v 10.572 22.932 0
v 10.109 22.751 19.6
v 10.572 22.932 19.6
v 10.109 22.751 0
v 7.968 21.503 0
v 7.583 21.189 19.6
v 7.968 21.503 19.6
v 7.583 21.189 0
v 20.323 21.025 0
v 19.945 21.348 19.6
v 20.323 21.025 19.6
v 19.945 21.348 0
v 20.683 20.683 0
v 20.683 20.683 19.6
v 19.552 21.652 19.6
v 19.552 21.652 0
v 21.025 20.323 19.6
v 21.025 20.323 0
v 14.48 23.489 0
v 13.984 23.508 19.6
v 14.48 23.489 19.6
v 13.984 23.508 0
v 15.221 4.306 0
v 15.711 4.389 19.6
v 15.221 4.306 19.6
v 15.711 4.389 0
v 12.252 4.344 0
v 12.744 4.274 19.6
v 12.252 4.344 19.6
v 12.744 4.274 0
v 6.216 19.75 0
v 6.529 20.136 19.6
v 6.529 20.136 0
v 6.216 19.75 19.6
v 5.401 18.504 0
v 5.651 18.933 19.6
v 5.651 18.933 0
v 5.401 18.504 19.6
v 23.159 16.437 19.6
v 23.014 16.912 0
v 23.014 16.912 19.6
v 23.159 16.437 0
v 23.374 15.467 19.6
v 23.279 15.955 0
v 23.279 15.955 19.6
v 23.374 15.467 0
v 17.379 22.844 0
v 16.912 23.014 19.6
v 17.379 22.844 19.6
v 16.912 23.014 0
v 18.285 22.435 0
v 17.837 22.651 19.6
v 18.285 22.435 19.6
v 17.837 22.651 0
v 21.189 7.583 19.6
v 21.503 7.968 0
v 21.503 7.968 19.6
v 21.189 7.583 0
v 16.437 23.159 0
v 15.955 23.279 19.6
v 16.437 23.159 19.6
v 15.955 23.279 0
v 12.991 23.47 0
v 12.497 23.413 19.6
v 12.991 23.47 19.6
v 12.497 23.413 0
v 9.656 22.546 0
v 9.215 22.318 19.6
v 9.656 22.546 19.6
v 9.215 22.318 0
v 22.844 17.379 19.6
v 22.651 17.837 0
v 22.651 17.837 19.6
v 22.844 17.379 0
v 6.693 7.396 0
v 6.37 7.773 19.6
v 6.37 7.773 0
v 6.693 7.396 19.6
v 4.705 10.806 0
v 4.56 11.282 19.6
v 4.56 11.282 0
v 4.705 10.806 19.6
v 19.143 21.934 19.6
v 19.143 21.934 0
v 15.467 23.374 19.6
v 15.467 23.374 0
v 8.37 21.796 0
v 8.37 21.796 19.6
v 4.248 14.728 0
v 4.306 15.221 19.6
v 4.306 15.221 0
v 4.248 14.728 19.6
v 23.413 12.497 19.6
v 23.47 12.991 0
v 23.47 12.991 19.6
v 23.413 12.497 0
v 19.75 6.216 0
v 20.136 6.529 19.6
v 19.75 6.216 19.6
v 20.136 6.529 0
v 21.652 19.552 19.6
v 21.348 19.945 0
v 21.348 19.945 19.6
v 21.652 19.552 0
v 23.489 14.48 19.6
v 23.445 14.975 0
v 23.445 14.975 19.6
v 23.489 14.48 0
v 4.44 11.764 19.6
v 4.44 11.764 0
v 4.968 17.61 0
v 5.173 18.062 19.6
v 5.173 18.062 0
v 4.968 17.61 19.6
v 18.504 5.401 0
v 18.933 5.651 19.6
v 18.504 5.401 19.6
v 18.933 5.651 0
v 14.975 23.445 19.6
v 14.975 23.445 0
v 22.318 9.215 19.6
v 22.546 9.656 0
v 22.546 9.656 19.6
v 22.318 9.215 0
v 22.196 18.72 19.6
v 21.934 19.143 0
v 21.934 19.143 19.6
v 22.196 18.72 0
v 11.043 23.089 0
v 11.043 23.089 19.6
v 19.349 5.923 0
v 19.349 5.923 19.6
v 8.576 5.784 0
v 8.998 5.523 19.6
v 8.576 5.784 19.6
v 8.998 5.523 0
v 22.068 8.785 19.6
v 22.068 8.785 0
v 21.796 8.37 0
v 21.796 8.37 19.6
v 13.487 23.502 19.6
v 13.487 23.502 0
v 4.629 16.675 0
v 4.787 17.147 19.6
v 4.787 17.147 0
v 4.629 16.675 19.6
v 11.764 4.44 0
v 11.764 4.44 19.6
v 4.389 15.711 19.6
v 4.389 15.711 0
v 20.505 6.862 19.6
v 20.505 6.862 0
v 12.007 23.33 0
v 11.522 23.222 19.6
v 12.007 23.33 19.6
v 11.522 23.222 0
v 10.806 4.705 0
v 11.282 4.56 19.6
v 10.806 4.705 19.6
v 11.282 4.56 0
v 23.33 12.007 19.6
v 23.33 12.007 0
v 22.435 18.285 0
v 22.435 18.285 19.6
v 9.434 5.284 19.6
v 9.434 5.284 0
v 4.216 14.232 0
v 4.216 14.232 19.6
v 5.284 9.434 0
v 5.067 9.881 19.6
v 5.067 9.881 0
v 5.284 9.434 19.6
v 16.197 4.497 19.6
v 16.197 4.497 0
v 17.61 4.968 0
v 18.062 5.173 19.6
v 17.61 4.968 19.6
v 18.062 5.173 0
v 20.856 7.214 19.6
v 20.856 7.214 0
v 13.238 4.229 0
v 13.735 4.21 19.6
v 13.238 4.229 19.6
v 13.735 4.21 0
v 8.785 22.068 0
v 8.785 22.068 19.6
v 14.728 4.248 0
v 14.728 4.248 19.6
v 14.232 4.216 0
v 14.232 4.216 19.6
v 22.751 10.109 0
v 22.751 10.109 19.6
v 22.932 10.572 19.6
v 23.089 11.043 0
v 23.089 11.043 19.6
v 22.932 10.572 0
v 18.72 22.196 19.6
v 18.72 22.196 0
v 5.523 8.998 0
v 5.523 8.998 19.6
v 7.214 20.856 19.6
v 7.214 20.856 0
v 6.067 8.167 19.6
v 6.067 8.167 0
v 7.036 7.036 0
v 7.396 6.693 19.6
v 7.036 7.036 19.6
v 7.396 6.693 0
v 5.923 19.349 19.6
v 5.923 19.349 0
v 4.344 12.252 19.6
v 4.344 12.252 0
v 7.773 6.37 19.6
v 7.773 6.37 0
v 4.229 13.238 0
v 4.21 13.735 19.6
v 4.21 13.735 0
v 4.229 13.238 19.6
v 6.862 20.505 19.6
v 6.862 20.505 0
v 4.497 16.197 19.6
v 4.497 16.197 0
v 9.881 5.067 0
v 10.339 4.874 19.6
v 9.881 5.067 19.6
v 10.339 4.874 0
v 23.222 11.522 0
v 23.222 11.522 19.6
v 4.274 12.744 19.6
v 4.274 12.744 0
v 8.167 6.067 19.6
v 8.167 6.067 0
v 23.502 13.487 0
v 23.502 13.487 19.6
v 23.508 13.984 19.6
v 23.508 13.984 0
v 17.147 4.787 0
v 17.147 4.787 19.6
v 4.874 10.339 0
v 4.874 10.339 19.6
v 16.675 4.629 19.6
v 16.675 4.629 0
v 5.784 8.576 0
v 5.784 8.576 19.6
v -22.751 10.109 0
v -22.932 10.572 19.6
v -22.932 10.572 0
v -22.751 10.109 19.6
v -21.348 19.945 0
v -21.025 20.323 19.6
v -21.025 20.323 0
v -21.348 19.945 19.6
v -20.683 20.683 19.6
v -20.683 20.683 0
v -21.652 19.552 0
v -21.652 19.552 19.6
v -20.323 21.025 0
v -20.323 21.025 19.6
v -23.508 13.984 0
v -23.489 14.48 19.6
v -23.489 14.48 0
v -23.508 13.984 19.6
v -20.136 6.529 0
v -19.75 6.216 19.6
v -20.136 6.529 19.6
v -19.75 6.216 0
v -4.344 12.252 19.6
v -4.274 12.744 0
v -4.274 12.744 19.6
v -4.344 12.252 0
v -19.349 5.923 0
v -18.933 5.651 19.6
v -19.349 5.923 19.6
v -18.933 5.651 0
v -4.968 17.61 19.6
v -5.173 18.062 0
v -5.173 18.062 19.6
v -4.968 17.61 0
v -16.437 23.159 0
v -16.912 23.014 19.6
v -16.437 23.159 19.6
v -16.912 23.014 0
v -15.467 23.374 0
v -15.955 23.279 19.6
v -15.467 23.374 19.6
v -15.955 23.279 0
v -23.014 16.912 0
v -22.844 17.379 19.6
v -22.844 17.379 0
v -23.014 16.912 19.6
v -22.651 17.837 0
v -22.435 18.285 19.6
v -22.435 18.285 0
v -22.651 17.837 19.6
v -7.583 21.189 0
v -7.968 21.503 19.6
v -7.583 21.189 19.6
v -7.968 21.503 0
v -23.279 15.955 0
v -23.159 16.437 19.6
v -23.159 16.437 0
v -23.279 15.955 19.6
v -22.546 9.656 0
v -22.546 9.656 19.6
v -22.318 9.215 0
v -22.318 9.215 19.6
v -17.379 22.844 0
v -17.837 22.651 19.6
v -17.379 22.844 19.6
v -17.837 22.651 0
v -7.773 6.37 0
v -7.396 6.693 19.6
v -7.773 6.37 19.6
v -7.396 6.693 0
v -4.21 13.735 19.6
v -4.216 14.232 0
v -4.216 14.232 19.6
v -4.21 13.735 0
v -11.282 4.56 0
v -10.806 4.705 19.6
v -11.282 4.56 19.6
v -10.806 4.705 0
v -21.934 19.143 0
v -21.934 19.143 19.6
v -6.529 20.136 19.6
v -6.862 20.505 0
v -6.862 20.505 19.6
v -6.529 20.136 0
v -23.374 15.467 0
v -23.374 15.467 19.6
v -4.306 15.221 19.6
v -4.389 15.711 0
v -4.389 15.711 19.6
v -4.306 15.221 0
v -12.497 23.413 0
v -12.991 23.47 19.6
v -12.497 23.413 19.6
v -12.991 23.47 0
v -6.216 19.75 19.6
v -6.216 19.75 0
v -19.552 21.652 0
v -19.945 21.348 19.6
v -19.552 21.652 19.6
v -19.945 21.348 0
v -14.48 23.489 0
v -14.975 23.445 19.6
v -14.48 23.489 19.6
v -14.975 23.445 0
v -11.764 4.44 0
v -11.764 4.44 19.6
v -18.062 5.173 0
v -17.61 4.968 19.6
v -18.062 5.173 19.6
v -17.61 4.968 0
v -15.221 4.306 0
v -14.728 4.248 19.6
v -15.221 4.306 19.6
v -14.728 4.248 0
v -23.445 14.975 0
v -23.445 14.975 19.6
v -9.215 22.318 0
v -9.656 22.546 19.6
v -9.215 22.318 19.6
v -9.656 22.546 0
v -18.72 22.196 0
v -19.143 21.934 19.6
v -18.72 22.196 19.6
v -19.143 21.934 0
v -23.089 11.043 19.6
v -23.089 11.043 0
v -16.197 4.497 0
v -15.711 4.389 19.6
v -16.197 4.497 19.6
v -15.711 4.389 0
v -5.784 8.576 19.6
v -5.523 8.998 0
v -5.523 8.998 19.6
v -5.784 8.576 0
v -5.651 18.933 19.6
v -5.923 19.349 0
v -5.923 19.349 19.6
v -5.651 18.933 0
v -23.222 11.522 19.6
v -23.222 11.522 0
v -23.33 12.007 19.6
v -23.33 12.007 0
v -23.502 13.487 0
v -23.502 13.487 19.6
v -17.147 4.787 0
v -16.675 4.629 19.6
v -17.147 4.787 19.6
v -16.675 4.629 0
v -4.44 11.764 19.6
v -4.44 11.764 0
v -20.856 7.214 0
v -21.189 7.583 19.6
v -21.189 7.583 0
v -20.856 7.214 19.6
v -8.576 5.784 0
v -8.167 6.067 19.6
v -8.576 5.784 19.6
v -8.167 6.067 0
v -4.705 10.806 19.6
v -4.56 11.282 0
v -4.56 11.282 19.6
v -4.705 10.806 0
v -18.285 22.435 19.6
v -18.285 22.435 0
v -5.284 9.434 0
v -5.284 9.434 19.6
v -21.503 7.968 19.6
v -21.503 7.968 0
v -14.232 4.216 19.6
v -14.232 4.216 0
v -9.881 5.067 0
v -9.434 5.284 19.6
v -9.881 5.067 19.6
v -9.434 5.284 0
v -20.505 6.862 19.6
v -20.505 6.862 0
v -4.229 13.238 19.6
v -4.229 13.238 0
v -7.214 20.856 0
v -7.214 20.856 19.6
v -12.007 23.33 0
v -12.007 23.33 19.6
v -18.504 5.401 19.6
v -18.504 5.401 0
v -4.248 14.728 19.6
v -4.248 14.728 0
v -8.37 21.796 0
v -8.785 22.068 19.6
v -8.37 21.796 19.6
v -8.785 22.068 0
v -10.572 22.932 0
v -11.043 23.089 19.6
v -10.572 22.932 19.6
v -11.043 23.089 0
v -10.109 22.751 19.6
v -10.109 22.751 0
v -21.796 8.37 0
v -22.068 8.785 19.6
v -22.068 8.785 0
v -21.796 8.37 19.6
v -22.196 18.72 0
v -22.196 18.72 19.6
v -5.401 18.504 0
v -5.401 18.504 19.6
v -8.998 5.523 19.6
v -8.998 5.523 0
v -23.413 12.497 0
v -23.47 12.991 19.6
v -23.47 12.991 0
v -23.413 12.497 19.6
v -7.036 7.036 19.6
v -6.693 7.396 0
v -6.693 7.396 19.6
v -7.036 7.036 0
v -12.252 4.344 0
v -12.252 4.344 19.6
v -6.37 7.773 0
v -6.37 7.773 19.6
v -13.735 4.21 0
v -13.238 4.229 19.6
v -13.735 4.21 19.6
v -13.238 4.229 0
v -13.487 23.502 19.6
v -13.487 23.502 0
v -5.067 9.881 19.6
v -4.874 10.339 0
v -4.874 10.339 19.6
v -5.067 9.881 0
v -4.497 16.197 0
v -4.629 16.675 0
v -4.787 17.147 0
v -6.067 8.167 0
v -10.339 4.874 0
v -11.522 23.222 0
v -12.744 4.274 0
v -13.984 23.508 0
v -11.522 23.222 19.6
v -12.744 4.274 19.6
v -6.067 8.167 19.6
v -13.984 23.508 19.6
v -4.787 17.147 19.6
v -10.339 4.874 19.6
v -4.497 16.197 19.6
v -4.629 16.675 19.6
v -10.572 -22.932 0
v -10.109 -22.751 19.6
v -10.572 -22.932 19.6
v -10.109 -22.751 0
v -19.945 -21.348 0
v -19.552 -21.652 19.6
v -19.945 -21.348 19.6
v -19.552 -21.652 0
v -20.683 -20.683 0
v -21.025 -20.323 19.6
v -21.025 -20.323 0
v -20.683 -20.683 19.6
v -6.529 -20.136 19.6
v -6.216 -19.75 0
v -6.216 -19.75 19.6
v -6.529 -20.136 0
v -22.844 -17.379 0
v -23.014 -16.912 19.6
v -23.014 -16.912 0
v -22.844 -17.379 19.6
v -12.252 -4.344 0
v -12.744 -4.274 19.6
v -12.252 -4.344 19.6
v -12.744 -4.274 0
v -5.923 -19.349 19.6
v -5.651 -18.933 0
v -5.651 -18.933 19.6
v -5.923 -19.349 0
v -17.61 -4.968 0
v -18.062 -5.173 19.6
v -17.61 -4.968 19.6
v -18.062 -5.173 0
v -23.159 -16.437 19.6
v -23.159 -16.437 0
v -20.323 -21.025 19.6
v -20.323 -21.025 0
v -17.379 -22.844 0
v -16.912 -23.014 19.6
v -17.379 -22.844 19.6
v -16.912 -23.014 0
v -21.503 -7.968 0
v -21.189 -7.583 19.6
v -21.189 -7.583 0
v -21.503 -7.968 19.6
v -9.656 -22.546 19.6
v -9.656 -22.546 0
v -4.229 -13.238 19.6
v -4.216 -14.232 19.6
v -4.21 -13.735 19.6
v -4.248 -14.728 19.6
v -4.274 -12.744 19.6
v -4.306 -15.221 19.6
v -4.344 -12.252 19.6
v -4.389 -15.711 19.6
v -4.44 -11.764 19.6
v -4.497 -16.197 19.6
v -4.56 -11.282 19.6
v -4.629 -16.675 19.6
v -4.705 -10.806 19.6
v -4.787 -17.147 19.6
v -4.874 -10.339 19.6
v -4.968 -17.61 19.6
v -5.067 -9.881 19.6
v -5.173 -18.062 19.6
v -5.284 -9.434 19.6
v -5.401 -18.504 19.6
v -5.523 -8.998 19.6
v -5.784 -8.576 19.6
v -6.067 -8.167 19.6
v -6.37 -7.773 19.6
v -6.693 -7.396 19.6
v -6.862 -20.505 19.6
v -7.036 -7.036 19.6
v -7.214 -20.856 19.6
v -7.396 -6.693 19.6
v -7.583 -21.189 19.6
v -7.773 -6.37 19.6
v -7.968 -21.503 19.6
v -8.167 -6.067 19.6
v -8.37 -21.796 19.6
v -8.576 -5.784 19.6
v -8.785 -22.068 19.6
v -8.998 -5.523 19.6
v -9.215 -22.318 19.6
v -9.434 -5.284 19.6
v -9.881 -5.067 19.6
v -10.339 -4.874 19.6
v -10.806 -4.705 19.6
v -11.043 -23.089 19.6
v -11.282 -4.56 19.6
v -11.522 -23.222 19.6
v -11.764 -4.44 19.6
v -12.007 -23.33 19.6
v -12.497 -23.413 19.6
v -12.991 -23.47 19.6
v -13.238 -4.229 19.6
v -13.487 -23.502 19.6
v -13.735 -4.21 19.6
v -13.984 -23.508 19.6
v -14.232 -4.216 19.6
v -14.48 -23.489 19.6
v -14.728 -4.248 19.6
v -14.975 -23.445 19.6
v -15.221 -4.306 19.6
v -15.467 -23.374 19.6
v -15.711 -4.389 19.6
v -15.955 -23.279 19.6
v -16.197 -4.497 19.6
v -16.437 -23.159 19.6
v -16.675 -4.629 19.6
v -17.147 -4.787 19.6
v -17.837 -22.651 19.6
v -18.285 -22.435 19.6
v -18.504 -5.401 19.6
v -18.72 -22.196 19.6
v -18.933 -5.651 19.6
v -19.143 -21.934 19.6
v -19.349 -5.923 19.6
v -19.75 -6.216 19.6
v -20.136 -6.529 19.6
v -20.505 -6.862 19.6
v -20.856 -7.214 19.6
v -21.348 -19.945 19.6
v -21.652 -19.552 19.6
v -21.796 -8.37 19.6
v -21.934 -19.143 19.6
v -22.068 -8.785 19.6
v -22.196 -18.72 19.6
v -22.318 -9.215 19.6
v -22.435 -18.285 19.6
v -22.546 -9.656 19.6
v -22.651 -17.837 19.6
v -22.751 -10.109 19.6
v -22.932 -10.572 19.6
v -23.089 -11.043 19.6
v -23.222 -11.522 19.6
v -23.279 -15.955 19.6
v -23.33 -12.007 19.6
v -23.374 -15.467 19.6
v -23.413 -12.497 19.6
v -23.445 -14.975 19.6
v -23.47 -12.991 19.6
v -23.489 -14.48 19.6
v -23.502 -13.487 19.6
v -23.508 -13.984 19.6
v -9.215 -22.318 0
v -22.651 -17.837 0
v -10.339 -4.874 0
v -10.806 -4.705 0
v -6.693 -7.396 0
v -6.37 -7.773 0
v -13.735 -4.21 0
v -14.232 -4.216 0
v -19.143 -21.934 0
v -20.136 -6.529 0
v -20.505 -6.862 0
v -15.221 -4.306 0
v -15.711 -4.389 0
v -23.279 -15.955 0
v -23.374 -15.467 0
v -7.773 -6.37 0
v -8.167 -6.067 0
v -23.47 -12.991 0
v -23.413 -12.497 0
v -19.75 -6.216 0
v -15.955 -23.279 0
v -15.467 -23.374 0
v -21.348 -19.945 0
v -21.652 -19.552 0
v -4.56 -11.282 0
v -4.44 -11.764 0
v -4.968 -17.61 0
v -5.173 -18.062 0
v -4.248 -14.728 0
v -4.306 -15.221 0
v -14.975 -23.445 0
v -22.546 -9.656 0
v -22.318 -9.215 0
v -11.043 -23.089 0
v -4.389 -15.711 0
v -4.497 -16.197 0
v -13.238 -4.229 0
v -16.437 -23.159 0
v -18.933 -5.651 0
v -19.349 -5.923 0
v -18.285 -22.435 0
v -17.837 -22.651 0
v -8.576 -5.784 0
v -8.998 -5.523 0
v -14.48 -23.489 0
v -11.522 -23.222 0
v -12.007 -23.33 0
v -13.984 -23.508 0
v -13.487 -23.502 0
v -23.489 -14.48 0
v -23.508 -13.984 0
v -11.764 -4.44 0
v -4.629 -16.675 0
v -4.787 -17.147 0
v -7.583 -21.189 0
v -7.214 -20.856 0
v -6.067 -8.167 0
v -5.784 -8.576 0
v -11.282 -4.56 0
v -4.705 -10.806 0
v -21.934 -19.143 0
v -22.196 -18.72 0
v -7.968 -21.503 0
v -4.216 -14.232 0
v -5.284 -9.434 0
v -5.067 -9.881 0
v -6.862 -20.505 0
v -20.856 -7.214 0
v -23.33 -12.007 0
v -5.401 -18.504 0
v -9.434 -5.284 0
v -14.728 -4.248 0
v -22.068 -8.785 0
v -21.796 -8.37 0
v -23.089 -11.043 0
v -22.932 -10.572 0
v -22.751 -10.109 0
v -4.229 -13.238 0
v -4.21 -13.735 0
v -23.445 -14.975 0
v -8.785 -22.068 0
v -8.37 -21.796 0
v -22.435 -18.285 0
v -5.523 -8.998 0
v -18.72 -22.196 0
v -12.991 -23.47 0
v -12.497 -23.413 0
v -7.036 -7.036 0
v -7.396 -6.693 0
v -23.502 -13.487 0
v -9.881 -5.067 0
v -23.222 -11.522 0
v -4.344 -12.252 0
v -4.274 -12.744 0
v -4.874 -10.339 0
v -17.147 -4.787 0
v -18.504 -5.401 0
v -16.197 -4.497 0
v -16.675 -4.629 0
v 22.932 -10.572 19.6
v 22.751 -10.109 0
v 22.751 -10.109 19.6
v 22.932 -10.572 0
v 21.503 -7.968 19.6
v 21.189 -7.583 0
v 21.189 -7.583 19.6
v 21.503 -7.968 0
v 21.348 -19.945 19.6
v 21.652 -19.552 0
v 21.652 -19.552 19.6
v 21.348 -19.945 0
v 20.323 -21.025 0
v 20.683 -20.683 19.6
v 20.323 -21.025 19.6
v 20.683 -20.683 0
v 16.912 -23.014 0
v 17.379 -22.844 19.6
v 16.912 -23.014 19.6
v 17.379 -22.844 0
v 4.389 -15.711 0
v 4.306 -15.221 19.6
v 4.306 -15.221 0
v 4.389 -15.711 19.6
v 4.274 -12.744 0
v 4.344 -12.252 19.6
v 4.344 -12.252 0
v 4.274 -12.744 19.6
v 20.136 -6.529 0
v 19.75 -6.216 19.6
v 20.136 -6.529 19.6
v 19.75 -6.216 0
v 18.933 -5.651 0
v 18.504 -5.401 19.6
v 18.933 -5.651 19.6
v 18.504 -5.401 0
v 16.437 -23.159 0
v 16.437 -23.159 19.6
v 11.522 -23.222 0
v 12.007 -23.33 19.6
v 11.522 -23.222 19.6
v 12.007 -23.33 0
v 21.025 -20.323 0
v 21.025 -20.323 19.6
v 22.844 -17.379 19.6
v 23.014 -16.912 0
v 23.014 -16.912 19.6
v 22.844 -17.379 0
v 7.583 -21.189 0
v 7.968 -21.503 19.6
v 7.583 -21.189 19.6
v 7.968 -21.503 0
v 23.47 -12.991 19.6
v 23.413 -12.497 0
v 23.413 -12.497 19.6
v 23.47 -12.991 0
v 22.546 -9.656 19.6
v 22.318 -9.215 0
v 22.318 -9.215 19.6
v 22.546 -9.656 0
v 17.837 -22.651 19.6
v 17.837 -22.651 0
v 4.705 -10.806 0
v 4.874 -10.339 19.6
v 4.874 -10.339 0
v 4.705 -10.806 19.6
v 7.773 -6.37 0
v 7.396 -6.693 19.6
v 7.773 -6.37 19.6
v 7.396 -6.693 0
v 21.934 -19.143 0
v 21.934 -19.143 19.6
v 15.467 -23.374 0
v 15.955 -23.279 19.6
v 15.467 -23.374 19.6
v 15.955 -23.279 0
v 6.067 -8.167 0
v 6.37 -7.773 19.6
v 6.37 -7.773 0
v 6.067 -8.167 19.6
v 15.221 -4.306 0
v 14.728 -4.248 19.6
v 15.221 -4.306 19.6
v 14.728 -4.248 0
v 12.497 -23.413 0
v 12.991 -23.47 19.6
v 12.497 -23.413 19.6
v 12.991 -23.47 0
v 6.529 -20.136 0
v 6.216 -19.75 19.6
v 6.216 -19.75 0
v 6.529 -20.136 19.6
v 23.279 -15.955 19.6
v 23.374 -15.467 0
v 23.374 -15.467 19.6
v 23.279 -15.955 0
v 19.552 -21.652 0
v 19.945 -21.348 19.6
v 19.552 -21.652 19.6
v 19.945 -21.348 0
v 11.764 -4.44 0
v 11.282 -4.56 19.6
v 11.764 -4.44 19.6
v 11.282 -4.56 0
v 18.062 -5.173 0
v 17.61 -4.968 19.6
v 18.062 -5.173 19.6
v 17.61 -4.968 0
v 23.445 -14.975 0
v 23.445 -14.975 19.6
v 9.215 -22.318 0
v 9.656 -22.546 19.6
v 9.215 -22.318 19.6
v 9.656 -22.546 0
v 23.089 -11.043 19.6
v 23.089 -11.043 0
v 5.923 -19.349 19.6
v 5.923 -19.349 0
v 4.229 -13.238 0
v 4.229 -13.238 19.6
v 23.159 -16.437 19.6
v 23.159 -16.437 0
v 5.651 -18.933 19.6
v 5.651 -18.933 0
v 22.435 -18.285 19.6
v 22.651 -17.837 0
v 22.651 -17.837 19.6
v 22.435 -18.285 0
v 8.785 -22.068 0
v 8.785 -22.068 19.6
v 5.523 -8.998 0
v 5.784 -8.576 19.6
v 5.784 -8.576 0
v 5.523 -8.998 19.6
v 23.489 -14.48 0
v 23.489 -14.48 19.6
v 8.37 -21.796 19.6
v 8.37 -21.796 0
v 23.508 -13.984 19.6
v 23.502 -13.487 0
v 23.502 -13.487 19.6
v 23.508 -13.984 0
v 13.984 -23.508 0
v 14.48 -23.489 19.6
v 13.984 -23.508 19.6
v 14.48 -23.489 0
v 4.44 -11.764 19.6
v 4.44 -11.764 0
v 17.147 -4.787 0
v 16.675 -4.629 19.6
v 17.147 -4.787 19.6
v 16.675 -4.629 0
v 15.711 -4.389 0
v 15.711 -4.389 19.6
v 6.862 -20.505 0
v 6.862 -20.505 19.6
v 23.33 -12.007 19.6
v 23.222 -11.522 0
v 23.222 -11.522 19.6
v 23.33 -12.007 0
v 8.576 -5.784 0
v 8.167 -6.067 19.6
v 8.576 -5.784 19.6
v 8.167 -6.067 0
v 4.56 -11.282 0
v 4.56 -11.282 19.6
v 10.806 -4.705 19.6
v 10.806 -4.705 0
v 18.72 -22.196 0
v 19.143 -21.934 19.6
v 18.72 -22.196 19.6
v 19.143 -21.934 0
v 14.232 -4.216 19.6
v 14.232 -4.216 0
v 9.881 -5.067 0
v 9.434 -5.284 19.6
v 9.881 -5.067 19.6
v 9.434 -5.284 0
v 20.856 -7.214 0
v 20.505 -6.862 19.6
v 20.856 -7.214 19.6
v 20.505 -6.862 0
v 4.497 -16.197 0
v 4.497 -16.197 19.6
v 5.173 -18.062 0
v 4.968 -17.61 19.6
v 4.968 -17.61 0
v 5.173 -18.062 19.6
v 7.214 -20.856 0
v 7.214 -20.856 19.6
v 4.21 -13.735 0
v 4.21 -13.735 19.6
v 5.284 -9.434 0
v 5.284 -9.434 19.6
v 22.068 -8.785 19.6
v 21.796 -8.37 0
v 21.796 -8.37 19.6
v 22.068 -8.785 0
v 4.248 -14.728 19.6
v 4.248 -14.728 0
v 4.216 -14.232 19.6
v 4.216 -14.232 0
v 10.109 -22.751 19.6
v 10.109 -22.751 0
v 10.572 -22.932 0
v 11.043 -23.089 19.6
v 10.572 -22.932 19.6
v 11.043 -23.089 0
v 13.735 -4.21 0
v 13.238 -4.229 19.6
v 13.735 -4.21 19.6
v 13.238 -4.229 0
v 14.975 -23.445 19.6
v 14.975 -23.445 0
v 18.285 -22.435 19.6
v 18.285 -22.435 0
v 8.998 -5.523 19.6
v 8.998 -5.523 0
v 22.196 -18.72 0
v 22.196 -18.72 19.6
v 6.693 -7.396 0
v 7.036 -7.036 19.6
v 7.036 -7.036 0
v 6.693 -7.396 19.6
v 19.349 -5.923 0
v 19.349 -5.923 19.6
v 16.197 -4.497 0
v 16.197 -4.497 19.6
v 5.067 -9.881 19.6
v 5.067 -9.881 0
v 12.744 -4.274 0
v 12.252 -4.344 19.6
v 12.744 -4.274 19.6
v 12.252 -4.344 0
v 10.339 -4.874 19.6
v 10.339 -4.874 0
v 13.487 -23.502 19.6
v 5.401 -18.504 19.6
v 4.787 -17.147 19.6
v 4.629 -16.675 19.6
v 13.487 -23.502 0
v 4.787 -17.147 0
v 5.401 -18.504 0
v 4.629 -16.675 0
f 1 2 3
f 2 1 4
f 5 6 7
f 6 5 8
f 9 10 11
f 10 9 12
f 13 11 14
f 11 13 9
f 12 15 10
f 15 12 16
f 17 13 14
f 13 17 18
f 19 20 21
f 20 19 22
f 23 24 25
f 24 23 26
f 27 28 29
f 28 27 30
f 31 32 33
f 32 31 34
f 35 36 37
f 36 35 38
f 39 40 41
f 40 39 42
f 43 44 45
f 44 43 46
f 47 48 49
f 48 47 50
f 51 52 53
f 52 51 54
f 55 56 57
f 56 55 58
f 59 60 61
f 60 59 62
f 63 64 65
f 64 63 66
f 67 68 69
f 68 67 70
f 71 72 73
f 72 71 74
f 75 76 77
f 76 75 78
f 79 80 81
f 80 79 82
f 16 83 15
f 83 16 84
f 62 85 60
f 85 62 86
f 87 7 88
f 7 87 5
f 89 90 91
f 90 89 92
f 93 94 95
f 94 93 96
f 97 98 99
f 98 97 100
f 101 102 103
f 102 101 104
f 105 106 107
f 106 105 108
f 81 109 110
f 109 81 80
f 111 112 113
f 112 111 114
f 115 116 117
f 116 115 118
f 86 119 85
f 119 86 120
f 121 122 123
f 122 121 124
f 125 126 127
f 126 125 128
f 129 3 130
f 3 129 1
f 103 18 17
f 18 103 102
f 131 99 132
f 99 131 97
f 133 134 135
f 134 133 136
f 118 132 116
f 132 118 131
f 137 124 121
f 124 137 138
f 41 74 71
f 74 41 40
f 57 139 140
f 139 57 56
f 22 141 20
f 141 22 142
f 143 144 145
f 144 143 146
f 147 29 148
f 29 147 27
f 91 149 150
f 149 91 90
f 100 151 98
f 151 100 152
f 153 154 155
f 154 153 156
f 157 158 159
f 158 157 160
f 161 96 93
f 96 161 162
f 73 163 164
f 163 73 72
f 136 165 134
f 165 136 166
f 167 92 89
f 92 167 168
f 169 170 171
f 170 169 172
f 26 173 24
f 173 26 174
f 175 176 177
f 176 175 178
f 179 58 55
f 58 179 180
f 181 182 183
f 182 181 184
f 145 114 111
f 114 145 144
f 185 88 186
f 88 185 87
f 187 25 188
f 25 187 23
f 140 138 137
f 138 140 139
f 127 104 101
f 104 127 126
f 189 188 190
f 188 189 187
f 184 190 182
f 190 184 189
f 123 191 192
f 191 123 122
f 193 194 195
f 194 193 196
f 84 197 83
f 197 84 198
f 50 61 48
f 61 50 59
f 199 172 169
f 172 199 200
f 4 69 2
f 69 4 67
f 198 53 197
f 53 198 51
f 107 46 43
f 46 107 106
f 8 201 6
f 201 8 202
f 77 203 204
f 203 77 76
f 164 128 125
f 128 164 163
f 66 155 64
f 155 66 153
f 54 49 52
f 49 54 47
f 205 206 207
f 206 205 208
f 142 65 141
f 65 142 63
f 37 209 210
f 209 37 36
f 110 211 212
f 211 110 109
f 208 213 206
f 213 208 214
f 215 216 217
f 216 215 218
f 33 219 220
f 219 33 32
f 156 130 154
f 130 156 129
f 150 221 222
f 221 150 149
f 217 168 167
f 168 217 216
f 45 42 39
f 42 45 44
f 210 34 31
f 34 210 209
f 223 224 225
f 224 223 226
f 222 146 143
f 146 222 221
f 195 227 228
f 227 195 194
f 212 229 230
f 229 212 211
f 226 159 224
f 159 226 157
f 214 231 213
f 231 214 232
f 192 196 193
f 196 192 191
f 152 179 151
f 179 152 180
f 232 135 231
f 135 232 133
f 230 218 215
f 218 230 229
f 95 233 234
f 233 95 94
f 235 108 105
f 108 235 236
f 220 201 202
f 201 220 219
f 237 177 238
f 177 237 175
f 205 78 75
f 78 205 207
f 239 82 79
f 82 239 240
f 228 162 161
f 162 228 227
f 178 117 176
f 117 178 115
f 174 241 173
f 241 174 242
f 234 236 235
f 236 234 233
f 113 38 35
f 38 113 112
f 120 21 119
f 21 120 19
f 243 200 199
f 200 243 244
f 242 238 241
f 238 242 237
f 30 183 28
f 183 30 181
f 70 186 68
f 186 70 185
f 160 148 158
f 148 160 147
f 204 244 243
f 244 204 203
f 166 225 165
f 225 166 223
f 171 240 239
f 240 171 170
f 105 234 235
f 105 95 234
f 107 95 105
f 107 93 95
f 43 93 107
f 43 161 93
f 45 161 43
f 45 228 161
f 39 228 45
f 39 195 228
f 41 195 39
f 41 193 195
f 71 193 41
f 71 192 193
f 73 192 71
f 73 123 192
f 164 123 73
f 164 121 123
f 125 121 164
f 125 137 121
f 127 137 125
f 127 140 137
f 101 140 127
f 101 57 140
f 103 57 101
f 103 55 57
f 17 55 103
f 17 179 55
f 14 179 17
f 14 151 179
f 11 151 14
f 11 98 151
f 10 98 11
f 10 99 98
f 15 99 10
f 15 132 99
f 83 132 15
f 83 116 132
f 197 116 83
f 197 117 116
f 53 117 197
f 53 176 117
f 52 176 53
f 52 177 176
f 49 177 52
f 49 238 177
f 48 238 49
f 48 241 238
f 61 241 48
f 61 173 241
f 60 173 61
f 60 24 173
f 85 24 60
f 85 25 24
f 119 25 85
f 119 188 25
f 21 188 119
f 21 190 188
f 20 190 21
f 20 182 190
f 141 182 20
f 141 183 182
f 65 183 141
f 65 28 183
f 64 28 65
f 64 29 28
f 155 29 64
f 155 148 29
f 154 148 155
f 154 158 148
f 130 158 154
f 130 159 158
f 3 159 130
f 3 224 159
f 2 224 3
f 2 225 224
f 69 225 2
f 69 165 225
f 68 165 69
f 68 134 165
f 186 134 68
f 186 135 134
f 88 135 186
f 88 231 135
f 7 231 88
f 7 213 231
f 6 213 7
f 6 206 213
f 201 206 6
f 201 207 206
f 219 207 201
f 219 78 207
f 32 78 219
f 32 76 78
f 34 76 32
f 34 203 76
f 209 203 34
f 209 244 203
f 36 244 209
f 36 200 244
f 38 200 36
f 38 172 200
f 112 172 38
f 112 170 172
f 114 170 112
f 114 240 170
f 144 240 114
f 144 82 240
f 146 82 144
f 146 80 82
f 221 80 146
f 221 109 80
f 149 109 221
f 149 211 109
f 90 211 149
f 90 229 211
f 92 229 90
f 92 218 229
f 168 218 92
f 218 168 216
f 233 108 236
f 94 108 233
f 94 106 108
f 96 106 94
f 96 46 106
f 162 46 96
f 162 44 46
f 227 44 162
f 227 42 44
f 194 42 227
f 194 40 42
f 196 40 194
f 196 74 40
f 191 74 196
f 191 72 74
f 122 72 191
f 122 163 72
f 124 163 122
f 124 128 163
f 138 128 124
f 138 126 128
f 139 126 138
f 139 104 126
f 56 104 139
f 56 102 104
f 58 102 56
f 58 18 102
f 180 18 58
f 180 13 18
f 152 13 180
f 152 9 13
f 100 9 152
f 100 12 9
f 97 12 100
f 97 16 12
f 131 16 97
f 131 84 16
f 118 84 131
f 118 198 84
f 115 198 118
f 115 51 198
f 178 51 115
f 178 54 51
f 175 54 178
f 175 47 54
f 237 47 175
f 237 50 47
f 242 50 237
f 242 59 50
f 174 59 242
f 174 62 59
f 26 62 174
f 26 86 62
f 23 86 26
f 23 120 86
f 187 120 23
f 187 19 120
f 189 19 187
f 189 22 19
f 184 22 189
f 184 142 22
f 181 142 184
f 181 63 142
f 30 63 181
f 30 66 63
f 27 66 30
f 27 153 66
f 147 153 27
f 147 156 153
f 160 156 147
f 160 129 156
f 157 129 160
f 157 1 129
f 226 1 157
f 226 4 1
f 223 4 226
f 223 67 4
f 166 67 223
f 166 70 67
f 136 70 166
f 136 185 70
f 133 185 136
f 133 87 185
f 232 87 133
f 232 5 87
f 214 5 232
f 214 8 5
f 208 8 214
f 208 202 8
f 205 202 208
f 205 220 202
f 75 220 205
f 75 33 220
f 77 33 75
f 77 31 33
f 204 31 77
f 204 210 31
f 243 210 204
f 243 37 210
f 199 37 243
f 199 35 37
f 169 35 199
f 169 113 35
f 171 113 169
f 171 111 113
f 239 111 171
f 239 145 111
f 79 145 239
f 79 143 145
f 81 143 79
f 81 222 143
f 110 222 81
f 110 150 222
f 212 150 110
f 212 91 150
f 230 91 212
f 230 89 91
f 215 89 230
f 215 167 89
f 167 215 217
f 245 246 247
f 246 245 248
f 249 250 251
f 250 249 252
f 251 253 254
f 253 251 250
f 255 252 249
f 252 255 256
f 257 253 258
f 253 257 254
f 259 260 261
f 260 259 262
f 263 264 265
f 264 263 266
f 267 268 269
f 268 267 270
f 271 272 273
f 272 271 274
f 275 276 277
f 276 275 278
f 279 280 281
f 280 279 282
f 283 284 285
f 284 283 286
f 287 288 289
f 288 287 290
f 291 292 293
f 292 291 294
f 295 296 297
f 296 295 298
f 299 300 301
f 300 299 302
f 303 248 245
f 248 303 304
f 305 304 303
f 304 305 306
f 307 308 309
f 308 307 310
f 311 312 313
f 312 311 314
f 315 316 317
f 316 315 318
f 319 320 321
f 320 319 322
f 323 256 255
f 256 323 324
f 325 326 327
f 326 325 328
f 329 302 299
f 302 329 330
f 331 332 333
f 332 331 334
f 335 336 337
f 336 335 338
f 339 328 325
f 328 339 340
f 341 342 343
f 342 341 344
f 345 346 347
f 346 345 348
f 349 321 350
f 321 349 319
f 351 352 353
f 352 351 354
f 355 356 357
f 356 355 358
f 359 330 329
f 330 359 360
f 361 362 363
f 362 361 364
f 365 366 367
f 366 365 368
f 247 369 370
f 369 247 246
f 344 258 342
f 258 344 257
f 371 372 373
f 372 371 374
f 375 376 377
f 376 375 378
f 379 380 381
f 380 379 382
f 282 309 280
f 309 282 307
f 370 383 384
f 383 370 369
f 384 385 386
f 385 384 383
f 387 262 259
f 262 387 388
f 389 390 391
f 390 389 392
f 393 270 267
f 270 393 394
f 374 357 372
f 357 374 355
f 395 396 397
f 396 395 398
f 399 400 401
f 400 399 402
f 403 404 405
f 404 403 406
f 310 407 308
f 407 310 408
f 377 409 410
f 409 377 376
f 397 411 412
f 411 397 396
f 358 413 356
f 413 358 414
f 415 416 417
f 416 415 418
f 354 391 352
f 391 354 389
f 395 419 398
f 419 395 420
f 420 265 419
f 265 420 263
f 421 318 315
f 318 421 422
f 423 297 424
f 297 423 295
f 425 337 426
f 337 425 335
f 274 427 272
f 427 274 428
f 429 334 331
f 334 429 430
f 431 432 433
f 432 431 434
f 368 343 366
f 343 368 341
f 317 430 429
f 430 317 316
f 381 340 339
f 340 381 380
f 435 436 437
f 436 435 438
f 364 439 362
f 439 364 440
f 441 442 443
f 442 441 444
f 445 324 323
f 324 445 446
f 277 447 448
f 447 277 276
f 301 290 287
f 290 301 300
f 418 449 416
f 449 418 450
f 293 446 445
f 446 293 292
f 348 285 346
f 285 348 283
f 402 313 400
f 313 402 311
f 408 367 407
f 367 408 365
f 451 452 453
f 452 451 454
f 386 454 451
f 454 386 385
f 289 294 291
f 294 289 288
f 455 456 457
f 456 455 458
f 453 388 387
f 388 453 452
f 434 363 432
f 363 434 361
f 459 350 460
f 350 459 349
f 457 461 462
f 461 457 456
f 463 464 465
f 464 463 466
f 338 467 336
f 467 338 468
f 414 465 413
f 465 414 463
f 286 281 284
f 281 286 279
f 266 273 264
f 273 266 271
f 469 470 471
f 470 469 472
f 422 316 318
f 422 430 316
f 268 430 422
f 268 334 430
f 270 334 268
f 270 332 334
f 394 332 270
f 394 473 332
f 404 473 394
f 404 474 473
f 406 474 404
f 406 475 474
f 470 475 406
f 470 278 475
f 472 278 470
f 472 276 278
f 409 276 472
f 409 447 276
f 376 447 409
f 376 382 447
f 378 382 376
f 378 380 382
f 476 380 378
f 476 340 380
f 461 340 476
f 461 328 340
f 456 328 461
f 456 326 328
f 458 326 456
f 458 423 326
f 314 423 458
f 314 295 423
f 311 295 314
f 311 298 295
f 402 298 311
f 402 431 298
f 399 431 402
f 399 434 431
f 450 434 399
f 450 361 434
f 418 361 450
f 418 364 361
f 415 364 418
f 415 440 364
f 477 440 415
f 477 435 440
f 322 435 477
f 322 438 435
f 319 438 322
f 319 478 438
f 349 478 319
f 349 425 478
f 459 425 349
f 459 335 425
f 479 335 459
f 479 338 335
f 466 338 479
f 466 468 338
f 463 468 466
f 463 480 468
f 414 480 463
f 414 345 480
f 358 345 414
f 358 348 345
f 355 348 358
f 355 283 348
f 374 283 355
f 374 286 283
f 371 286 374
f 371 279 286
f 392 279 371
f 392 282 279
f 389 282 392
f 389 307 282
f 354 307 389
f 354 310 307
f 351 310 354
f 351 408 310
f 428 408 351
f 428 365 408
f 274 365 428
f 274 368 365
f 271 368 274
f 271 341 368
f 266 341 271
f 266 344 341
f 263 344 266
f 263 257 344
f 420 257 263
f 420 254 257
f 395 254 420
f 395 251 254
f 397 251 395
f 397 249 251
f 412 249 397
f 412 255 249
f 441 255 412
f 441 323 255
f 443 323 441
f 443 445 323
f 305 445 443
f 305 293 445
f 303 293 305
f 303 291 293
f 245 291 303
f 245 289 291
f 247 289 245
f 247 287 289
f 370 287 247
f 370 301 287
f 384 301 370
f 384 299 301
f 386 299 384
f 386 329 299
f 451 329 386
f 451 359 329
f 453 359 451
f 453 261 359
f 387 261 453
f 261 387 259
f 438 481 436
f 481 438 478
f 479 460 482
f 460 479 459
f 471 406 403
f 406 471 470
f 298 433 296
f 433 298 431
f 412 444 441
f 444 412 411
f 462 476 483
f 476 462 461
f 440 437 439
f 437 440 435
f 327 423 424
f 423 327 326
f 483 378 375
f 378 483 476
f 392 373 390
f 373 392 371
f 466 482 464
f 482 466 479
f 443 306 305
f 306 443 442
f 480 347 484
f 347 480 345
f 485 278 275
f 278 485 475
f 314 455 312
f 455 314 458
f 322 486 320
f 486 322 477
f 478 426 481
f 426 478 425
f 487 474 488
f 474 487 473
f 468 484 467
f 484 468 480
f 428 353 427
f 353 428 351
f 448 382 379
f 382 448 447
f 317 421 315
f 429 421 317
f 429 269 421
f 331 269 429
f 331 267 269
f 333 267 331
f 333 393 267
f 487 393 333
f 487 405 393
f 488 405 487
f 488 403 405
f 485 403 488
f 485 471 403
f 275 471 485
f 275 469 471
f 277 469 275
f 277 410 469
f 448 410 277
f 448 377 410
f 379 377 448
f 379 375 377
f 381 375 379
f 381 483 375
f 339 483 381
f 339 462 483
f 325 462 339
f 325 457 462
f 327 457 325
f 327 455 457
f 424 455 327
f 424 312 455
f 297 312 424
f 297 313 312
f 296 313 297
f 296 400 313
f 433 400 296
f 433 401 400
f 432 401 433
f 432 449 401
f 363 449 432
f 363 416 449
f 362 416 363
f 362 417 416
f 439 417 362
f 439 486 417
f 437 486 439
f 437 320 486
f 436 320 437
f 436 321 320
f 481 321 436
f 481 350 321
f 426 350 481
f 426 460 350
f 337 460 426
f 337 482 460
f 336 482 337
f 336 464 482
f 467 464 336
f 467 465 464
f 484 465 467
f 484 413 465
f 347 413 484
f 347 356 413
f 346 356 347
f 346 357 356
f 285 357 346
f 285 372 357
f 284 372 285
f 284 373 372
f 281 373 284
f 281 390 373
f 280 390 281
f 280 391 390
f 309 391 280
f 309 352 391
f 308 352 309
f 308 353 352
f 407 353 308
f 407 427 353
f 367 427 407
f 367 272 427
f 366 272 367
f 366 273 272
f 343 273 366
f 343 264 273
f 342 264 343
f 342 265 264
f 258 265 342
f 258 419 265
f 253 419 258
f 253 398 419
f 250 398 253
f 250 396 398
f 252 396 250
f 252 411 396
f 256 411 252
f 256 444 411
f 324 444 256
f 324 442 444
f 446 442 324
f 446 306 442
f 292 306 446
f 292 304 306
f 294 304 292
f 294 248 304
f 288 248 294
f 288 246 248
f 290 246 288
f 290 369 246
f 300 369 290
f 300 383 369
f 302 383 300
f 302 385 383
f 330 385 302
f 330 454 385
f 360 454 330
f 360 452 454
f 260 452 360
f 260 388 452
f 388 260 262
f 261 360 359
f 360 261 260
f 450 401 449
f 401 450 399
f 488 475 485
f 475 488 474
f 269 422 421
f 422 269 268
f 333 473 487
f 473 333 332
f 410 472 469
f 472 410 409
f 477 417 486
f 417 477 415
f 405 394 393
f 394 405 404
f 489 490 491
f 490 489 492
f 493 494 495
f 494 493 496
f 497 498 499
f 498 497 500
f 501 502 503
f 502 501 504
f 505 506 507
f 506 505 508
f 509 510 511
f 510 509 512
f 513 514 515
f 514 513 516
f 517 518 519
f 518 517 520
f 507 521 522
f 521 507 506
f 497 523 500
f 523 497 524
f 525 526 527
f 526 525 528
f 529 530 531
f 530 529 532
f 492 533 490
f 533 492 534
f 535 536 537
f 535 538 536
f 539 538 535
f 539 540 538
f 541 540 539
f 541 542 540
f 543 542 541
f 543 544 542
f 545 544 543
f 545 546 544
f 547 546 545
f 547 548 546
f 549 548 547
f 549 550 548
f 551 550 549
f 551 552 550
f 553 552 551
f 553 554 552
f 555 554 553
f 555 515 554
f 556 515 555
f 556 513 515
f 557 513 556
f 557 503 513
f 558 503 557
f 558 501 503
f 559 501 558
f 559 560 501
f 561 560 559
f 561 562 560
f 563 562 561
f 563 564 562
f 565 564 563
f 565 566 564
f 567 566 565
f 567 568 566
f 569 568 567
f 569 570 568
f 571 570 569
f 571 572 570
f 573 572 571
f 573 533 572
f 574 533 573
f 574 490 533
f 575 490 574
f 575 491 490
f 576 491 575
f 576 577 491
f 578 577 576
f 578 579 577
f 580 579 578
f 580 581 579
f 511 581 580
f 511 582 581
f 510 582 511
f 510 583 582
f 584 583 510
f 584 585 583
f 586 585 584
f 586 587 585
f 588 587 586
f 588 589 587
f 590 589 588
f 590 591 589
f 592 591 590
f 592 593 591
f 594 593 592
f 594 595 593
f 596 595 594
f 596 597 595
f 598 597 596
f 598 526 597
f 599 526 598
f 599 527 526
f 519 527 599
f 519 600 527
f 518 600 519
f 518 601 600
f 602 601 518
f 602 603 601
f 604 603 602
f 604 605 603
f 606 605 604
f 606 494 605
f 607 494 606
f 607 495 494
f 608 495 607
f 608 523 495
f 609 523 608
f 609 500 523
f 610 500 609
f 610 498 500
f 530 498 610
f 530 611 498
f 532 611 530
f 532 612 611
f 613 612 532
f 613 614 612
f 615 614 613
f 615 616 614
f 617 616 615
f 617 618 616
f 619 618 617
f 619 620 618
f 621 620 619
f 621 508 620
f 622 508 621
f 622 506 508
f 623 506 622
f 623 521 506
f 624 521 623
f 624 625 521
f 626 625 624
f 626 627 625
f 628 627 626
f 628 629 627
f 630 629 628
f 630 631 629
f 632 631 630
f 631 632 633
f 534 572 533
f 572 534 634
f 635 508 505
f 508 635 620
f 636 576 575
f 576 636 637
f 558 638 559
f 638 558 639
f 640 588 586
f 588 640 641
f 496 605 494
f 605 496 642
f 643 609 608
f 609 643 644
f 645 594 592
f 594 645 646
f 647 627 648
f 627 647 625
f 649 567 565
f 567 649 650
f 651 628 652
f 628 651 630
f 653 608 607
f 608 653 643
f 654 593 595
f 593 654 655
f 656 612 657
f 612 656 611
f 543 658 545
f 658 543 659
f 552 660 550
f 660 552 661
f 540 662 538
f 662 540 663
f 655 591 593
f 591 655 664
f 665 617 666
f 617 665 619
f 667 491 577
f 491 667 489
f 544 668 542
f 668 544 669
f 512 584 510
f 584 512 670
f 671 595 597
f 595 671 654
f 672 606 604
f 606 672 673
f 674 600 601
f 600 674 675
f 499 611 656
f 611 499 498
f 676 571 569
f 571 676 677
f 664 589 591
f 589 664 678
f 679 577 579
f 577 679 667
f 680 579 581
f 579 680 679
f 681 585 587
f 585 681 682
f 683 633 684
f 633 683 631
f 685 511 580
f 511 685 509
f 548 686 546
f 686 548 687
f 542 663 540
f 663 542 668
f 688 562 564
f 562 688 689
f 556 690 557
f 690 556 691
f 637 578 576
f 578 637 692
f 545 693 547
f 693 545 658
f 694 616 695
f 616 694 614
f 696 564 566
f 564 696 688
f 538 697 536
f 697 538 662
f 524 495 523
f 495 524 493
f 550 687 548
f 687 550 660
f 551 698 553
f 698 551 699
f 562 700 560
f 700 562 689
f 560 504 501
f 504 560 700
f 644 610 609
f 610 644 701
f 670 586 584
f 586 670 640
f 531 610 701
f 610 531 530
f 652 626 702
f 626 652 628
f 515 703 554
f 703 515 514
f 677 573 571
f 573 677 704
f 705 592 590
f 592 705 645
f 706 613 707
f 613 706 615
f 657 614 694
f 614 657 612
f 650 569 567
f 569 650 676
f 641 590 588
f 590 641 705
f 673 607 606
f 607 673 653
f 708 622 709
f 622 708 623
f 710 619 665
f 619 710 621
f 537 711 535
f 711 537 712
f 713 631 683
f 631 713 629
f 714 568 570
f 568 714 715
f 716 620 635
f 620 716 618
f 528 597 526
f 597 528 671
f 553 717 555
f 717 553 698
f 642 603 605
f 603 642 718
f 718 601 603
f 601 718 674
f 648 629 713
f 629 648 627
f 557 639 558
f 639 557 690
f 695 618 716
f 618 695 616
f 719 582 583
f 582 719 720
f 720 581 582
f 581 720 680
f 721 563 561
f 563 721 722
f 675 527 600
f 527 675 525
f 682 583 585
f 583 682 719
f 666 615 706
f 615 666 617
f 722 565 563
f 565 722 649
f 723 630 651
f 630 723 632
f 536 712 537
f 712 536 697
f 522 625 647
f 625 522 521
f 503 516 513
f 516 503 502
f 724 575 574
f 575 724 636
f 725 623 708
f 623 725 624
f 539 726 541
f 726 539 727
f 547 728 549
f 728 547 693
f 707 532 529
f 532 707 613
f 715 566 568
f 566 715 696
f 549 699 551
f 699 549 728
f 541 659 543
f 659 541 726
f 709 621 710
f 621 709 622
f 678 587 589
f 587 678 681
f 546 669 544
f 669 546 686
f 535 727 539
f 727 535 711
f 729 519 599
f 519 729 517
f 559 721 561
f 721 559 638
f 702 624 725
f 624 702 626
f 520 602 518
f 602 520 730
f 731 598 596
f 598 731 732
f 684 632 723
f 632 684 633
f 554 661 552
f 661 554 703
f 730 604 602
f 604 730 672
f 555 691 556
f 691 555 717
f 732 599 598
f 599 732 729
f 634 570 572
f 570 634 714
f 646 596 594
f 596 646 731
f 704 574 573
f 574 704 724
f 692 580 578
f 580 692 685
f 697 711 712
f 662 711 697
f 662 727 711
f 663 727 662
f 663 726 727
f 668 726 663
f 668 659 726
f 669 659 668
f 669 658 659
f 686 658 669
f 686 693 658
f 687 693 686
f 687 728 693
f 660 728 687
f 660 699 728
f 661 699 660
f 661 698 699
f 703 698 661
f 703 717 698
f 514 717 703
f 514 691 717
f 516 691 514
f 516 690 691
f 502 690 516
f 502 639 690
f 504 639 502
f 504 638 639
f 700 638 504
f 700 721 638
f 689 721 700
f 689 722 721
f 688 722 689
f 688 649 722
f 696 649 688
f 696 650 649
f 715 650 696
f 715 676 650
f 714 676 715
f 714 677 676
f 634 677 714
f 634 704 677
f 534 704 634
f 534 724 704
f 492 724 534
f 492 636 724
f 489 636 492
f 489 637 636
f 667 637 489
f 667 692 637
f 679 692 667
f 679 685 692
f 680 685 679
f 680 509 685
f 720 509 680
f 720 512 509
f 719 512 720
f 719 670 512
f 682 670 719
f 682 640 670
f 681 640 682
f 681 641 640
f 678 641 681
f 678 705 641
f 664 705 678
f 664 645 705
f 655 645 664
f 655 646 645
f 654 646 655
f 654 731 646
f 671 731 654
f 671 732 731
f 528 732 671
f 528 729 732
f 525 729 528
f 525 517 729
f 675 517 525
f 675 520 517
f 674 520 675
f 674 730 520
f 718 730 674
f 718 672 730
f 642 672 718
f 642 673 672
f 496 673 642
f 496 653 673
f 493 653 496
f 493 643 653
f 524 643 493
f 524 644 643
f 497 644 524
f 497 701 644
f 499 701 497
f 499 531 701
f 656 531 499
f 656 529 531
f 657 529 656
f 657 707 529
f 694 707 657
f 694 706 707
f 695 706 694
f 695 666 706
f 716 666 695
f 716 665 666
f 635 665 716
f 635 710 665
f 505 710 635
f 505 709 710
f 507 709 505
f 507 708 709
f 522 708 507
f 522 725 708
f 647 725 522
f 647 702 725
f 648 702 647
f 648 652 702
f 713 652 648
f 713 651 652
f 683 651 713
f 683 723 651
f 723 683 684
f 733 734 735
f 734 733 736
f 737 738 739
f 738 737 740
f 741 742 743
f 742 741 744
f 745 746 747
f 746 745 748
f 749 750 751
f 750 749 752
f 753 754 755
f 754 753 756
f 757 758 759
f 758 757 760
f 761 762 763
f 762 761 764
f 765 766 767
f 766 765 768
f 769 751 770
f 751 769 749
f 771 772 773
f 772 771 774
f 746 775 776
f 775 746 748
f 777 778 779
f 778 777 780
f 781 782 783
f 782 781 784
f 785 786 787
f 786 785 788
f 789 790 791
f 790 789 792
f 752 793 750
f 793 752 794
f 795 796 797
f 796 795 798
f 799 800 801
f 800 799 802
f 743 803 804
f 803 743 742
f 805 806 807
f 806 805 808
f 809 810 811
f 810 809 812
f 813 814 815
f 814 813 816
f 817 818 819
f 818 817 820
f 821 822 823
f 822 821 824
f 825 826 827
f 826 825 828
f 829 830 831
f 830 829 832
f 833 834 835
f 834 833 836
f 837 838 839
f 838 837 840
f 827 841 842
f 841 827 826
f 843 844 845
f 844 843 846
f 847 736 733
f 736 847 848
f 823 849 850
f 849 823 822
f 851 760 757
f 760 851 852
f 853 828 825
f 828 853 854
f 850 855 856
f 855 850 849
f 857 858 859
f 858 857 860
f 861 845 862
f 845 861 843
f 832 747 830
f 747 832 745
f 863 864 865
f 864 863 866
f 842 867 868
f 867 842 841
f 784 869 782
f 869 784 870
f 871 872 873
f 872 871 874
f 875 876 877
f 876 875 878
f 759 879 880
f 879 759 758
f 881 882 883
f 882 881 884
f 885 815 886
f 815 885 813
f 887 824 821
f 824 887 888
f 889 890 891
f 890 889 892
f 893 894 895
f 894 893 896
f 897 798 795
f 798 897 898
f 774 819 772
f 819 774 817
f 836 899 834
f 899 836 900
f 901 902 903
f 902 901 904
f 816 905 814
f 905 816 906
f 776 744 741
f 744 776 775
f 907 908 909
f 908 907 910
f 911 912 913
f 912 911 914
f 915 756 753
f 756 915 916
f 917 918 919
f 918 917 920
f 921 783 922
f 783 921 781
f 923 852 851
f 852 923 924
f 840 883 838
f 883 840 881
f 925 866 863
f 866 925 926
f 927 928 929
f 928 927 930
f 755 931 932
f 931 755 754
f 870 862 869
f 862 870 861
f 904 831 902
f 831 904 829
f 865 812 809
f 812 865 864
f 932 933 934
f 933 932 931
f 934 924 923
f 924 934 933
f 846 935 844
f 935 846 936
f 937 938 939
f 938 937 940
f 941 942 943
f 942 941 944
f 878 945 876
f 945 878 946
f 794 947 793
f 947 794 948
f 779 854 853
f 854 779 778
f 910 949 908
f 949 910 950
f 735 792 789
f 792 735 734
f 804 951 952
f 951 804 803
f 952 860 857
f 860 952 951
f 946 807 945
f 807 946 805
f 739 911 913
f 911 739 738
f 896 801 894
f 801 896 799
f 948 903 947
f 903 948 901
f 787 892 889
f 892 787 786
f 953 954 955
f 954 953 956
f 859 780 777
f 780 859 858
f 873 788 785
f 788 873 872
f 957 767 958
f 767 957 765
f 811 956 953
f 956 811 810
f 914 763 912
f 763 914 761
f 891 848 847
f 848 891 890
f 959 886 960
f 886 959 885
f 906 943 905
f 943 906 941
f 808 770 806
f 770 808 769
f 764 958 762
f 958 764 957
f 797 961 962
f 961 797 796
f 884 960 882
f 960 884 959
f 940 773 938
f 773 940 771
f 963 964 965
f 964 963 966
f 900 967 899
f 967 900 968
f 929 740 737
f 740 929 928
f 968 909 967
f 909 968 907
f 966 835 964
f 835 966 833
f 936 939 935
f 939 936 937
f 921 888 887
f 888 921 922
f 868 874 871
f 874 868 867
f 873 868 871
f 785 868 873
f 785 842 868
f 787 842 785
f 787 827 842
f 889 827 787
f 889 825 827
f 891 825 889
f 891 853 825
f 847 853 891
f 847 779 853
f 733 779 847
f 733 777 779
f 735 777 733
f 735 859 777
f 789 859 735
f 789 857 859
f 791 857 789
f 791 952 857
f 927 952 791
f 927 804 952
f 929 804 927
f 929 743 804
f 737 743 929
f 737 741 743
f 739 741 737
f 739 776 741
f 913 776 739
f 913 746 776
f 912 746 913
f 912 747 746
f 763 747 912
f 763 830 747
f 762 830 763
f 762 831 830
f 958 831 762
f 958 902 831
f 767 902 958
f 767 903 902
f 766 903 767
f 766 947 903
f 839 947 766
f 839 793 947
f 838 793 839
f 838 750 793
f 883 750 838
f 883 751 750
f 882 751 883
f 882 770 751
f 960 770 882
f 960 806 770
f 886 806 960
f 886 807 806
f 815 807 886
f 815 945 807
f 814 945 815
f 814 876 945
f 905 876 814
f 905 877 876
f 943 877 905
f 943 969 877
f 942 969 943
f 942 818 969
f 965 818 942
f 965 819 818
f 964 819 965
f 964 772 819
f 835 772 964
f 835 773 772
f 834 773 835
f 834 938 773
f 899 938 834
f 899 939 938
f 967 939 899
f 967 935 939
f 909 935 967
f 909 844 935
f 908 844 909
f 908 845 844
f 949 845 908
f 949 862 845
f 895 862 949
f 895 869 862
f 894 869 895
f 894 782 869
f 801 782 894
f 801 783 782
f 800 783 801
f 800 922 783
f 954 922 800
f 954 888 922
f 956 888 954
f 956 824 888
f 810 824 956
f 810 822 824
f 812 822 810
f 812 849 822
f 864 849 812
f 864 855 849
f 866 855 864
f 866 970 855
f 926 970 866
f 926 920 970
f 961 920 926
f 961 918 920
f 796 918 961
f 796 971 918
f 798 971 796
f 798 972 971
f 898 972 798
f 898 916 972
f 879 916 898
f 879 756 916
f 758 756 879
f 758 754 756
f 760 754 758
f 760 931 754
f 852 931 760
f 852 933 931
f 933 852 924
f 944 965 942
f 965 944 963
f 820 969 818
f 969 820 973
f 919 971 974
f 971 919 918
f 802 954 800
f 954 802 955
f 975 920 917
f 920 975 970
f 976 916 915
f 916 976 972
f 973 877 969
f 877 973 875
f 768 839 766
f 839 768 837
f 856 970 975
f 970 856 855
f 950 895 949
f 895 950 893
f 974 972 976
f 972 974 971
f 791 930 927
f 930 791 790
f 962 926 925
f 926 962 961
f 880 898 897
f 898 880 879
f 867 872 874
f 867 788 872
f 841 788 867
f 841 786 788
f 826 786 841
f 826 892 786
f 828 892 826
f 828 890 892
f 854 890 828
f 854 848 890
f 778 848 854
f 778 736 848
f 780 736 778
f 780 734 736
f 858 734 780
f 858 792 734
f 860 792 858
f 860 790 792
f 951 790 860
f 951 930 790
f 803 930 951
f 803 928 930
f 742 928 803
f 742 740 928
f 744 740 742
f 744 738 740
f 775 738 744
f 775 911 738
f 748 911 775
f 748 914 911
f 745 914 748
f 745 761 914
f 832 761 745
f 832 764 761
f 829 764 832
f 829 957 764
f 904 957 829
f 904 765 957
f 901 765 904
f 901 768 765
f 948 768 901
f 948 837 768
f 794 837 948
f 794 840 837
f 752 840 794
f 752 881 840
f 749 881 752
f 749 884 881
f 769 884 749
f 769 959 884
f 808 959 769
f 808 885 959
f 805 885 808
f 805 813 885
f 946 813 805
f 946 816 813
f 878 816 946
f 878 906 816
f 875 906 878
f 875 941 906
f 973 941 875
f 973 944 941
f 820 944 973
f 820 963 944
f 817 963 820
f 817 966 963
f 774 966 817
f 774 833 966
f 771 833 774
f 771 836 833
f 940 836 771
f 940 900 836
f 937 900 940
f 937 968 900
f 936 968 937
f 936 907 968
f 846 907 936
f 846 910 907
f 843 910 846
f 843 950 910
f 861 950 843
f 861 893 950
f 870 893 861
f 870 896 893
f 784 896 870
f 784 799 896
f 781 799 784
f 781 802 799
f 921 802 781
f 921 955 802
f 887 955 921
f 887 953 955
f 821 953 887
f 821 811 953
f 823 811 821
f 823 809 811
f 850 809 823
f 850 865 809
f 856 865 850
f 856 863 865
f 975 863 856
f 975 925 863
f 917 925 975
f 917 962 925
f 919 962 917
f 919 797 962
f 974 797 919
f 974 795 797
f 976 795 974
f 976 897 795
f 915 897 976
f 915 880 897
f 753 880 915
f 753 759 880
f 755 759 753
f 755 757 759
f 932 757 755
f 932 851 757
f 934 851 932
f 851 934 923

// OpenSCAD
$fa=0.5; // default minimum facet angle is now 0.5
$fs=0.5; // default minimum facet size is now 0.5 mm

foot_d = 19.3;
foot_h = 19.6;

for (i=[0,90,180,270]) {
    rotate([0, 0, 45+i]) translate([foot_h, 0, 0]) cylinder(d = foot_d, h=foot_h);
}
